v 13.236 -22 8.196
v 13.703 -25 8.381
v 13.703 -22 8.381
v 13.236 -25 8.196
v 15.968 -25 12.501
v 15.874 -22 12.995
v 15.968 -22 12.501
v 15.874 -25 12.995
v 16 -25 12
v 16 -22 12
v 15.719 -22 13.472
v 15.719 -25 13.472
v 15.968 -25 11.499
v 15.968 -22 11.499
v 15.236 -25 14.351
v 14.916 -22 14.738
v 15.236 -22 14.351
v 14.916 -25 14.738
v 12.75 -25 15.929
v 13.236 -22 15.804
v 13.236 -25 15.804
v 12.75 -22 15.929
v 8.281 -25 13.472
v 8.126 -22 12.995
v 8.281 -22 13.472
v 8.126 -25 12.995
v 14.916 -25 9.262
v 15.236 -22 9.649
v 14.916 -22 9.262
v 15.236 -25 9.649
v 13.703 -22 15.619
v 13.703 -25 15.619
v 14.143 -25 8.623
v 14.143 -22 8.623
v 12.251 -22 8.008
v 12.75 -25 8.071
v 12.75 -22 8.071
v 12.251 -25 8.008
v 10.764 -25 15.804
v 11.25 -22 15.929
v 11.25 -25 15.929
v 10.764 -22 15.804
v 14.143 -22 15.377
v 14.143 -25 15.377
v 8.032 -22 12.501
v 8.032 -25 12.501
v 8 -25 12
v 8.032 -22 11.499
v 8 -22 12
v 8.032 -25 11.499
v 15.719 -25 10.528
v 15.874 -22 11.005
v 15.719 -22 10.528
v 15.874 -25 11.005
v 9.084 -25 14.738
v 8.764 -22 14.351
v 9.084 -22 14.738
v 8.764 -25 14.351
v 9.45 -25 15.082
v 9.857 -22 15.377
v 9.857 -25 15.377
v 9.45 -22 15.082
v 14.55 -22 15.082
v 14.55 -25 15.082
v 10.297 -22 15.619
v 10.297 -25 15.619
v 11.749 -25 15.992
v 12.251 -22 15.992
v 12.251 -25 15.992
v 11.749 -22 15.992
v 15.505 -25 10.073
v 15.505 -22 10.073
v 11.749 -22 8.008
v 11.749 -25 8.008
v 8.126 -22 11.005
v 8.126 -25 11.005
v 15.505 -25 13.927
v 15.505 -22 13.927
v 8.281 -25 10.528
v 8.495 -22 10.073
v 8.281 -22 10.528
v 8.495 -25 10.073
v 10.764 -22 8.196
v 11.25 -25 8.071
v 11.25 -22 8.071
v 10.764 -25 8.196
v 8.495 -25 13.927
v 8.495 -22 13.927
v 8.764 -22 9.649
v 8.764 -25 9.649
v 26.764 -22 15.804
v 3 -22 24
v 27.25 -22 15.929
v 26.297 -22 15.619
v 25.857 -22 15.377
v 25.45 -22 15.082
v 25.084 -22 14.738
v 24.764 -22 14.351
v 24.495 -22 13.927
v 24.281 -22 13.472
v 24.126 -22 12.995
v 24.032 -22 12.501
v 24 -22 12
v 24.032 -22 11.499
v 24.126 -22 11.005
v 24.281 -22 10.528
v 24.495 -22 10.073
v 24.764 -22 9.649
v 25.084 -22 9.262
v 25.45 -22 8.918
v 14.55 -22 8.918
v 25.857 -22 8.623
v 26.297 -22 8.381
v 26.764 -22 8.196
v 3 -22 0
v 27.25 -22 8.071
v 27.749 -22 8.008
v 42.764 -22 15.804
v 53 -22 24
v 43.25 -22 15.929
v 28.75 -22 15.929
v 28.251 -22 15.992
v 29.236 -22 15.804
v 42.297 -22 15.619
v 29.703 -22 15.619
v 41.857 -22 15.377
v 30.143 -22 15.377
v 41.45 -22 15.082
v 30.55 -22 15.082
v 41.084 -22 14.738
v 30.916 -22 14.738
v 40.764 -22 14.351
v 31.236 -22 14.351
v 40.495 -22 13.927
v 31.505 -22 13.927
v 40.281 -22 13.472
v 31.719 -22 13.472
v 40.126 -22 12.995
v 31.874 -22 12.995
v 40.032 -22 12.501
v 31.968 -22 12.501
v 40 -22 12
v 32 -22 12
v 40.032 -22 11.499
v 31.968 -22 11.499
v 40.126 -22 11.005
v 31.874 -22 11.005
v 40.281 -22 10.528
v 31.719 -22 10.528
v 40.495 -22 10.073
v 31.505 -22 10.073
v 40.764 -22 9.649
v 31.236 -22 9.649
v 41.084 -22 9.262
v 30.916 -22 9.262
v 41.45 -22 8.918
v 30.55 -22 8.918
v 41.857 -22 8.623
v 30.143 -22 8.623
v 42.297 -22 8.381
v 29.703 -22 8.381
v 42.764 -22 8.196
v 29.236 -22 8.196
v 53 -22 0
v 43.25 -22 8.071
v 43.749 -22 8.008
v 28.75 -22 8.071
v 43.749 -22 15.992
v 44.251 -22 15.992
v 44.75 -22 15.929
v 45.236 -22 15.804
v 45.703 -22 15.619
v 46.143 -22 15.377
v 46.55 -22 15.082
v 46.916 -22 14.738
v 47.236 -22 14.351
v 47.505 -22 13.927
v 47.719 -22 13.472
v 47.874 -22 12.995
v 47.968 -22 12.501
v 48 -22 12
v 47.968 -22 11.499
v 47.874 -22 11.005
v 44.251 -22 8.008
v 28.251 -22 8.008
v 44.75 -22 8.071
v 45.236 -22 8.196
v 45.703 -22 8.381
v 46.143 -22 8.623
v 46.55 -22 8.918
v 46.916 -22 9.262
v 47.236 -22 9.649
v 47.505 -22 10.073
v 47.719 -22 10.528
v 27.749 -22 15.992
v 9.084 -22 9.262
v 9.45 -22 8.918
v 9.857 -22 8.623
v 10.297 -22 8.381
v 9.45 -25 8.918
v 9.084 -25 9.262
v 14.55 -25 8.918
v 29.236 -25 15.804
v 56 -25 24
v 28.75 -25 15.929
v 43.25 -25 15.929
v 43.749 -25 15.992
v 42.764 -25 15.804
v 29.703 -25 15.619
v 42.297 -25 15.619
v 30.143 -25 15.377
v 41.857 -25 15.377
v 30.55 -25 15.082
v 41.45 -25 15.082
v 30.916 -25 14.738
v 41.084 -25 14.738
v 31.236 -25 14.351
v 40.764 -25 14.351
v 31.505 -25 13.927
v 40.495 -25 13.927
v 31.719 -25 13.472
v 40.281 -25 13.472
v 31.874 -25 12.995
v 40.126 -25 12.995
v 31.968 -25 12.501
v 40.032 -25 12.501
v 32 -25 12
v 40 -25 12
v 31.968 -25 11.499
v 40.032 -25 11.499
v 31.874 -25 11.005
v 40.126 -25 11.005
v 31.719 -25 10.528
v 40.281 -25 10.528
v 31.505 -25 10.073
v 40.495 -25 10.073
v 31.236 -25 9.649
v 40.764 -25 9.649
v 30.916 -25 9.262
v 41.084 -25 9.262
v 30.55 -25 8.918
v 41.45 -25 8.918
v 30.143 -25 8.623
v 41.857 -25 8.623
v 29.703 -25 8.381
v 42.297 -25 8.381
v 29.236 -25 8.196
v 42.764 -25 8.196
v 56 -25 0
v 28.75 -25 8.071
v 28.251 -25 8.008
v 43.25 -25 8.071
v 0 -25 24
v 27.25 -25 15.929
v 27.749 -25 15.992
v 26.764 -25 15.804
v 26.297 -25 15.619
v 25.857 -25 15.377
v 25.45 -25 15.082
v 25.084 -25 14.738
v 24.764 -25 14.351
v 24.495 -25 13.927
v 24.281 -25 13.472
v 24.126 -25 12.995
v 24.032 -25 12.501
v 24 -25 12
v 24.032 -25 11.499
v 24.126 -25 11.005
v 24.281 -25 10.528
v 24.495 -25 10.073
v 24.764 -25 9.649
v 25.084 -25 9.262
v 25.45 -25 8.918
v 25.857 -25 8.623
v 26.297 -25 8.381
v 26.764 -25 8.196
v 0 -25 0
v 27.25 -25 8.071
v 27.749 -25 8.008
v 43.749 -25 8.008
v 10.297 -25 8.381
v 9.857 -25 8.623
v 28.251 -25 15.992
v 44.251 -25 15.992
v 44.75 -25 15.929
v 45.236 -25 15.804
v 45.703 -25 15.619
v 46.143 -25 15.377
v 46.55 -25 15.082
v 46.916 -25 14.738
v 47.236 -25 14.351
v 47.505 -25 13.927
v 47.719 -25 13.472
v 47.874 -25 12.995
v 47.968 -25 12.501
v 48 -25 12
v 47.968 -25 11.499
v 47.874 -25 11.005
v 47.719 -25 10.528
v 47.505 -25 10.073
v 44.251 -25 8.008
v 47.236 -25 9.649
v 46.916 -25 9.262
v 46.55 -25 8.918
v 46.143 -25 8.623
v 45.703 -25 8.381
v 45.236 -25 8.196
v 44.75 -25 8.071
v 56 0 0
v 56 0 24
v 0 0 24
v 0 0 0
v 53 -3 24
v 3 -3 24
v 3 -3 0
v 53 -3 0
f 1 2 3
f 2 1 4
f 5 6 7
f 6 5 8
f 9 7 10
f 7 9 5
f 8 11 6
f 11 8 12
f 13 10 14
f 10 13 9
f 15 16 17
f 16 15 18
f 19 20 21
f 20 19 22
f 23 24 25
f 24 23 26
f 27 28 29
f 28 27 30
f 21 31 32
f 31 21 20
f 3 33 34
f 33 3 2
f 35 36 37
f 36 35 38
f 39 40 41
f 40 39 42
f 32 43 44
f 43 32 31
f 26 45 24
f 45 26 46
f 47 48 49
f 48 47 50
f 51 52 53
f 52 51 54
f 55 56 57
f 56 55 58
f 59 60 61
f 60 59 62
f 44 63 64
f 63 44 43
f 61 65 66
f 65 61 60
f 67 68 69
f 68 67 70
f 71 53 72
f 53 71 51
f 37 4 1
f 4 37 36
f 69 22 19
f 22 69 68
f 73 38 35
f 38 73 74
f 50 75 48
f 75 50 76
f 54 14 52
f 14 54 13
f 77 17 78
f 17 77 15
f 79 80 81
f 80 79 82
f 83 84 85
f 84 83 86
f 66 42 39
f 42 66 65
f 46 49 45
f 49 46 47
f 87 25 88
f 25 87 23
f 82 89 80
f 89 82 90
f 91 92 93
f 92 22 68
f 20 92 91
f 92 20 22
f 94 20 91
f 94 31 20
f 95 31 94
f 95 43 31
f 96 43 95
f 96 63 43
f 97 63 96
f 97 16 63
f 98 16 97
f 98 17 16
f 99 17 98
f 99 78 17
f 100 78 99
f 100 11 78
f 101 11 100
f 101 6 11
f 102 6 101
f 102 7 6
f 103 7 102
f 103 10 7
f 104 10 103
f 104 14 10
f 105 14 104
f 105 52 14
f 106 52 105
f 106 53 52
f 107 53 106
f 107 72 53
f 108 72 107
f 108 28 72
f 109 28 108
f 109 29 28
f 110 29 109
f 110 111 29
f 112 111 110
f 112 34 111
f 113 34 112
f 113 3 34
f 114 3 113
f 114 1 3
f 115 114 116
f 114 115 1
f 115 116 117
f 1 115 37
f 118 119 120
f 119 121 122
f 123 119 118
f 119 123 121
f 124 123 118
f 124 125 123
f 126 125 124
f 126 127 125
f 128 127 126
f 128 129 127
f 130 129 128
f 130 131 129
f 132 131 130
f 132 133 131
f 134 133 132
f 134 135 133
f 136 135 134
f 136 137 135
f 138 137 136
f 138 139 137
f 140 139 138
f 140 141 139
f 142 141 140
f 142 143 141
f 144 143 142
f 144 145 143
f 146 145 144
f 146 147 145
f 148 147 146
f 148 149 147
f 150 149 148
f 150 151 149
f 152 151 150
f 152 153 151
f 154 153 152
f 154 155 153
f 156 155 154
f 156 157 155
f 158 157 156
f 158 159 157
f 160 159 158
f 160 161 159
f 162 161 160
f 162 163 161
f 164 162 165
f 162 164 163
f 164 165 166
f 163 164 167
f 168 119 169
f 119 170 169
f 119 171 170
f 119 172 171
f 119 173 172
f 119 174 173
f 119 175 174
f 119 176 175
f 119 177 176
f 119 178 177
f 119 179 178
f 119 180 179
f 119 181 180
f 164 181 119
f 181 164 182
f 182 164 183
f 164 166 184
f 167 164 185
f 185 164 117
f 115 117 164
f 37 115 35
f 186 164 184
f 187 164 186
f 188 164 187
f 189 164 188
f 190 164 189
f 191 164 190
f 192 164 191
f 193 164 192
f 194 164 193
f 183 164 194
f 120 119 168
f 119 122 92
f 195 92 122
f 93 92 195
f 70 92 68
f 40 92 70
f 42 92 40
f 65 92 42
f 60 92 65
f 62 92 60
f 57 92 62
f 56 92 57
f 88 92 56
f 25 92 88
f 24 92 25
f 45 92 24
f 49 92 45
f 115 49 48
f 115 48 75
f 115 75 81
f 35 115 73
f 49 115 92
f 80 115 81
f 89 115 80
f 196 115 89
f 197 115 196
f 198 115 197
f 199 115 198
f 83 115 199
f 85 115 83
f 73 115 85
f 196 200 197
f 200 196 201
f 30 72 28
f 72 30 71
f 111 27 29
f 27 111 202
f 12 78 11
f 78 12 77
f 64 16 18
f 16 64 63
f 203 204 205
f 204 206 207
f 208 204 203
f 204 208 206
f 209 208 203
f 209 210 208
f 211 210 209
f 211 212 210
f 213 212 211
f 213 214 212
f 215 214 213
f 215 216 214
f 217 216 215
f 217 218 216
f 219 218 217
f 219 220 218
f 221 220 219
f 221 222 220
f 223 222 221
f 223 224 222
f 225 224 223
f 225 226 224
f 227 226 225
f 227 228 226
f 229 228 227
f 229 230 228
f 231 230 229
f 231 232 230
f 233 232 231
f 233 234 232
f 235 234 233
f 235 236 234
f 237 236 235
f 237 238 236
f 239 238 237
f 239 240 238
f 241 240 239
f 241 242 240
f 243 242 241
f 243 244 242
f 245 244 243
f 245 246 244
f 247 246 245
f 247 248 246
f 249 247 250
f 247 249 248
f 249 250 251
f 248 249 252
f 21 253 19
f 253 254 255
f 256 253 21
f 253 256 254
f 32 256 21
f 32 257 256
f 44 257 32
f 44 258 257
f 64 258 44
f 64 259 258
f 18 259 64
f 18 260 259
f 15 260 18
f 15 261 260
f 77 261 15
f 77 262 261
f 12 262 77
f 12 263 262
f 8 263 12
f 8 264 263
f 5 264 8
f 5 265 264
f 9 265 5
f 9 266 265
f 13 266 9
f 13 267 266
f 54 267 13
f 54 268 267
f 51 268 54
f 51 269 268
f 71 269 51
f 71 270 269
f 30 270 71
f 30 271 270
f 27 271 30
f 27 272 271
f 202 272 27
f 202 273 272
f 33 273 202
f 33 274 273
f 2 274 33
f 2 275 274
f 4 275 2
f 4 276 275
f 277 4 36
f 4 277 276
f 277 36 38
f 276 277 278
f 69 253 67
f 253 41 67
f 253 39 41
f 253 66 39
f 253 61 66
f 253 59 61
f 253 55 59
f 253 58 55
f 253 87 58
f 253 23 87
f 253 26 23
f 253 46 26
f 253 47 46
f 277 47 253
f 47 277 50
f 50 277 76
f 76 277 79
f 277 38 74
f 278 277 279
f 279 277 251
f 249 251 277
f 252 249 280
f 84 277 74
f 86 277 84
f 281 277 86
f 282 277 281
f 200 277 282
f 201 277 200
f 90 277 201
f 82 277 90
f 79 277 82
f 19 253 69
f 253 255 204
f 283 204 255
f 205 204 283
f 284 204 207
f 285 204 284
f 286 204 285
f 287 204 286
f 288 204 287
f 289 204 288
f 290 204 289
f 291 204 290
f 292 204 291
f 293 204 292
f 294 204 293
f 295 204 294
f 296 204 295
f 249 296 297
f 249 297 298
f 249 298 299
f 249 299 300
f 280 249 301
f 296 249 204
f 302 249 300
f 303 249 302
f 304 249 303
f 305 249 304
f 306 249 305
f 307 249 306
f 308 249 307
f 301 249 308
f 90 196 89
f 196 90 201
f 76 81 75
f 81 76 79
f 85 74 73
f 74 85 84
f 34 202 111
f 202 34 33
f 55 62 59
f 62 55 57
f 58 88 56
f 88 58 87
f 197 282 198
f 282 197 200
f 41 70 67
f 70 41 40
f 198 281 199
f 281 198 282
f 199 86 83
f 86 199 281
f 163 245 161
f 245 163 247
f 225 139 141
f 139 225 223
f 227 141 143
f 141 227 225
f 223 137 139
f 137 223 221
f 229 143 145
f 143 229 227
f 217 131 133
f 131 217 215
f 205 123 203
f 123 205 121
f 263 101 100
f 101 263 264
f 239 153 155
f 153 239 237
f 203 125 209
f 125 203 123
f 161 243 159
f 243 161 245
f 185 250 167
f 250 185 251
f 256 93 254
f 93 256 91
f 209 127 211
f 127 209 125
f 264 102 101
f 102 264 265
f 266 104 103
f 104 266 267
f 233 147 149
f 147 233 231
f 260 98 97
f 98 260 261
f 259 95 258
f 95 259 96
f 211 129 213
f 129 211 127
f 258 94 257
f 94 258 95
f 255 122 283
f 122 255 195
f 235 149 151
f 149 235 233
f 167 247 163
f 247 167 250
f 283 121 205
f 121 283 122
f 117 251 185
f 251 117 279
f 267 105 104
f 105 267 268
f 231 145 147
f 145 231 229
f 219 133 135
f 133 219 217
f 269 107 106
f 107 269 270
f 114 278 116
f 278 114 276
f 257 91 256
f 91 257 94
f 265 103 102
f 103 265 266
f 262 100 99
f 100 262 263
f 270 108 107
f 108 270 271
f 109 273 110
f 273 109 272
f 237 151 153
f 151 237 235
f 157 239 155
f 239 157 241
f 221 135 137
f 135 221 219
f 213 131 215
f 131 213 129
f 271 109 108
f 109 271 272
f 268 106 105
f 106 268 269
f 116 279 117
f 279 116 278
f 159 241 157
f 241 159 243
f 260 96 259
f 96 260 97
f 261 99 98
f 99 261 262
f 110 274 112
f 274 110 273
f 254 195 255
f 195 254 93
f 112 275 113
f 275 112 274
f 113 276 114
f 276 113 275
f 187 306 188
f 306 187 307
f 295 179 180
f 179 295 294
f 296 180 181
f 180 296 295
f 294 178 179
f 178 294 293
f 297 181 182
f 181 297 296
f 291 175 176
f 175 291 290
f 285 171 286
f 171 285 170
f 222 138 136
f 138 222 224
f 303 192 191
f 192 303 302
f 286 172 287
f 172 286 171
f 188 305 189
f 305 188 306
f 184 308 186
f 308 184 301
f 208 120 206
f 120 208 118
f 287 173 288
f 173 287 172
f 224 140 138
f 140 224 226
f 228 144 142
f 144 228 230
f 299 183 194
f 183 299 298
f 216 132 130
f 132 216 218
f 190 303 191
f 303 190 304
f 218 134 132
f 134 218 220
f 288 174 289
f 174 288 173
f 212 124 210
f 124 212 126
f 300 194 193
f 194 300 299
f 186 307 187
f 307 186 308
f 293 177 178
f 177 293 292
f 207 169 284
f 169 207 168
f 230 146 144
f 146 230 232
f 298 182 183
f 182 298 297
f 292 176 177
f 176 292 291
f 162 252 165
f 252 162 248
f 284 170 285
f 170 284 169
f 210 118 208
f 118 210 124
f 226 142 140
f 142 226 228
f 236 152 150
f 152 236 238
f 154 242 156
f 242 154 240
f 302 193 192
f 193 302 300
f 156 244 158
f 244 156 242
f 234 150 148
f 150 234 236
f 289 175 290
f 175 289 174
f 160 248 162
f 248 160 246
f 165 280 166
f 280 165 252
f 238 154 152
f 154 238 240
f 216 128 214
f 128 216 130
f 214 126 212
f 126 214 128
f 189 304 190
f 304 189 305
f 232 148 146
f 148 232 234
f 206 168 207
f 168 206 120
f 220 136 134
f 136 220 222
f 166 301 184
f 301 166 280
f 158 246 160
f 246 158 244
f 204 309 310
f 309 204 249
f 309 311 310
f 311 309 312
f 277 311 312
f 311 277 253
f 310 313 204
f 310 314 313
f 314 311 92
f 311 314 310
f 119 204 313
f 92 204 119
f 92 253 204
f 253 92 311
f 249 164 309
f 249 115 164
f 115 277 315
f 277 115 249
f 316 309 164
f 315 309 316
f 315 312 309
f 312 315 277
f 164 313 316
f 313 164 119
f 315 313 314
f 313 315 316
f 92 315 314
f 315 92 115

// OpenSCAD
// [FL_INDEX: keywords="openscad, 3d_parametric, Banana_socket_bench, csg_solid" | COT="Parametric OpenSCAD design from 3DCodeverse"]
// Title: Banana socket bench

holes=3;
diameter=8;
thickness=3;
height=25;

rotate([90, 0, 0]) {
	difference() {
		cube([diameter*(holes*2+1), diameter*thickness, height]);
	
		translate([thickness, 0, thickness]) {
			cube([diameter*(holes*2+1)-2*thickness, diameter*thickness, height-thickness*2]);
		}
	
		for (i = [1 : holes]) {
			translate([diameter/2+diameter*(2*i-1), diameter*1.5, height-thickness]) {
				cylinder(r=diameter/2, h=thickness, $fn=50);
			}
		}
	}
}
